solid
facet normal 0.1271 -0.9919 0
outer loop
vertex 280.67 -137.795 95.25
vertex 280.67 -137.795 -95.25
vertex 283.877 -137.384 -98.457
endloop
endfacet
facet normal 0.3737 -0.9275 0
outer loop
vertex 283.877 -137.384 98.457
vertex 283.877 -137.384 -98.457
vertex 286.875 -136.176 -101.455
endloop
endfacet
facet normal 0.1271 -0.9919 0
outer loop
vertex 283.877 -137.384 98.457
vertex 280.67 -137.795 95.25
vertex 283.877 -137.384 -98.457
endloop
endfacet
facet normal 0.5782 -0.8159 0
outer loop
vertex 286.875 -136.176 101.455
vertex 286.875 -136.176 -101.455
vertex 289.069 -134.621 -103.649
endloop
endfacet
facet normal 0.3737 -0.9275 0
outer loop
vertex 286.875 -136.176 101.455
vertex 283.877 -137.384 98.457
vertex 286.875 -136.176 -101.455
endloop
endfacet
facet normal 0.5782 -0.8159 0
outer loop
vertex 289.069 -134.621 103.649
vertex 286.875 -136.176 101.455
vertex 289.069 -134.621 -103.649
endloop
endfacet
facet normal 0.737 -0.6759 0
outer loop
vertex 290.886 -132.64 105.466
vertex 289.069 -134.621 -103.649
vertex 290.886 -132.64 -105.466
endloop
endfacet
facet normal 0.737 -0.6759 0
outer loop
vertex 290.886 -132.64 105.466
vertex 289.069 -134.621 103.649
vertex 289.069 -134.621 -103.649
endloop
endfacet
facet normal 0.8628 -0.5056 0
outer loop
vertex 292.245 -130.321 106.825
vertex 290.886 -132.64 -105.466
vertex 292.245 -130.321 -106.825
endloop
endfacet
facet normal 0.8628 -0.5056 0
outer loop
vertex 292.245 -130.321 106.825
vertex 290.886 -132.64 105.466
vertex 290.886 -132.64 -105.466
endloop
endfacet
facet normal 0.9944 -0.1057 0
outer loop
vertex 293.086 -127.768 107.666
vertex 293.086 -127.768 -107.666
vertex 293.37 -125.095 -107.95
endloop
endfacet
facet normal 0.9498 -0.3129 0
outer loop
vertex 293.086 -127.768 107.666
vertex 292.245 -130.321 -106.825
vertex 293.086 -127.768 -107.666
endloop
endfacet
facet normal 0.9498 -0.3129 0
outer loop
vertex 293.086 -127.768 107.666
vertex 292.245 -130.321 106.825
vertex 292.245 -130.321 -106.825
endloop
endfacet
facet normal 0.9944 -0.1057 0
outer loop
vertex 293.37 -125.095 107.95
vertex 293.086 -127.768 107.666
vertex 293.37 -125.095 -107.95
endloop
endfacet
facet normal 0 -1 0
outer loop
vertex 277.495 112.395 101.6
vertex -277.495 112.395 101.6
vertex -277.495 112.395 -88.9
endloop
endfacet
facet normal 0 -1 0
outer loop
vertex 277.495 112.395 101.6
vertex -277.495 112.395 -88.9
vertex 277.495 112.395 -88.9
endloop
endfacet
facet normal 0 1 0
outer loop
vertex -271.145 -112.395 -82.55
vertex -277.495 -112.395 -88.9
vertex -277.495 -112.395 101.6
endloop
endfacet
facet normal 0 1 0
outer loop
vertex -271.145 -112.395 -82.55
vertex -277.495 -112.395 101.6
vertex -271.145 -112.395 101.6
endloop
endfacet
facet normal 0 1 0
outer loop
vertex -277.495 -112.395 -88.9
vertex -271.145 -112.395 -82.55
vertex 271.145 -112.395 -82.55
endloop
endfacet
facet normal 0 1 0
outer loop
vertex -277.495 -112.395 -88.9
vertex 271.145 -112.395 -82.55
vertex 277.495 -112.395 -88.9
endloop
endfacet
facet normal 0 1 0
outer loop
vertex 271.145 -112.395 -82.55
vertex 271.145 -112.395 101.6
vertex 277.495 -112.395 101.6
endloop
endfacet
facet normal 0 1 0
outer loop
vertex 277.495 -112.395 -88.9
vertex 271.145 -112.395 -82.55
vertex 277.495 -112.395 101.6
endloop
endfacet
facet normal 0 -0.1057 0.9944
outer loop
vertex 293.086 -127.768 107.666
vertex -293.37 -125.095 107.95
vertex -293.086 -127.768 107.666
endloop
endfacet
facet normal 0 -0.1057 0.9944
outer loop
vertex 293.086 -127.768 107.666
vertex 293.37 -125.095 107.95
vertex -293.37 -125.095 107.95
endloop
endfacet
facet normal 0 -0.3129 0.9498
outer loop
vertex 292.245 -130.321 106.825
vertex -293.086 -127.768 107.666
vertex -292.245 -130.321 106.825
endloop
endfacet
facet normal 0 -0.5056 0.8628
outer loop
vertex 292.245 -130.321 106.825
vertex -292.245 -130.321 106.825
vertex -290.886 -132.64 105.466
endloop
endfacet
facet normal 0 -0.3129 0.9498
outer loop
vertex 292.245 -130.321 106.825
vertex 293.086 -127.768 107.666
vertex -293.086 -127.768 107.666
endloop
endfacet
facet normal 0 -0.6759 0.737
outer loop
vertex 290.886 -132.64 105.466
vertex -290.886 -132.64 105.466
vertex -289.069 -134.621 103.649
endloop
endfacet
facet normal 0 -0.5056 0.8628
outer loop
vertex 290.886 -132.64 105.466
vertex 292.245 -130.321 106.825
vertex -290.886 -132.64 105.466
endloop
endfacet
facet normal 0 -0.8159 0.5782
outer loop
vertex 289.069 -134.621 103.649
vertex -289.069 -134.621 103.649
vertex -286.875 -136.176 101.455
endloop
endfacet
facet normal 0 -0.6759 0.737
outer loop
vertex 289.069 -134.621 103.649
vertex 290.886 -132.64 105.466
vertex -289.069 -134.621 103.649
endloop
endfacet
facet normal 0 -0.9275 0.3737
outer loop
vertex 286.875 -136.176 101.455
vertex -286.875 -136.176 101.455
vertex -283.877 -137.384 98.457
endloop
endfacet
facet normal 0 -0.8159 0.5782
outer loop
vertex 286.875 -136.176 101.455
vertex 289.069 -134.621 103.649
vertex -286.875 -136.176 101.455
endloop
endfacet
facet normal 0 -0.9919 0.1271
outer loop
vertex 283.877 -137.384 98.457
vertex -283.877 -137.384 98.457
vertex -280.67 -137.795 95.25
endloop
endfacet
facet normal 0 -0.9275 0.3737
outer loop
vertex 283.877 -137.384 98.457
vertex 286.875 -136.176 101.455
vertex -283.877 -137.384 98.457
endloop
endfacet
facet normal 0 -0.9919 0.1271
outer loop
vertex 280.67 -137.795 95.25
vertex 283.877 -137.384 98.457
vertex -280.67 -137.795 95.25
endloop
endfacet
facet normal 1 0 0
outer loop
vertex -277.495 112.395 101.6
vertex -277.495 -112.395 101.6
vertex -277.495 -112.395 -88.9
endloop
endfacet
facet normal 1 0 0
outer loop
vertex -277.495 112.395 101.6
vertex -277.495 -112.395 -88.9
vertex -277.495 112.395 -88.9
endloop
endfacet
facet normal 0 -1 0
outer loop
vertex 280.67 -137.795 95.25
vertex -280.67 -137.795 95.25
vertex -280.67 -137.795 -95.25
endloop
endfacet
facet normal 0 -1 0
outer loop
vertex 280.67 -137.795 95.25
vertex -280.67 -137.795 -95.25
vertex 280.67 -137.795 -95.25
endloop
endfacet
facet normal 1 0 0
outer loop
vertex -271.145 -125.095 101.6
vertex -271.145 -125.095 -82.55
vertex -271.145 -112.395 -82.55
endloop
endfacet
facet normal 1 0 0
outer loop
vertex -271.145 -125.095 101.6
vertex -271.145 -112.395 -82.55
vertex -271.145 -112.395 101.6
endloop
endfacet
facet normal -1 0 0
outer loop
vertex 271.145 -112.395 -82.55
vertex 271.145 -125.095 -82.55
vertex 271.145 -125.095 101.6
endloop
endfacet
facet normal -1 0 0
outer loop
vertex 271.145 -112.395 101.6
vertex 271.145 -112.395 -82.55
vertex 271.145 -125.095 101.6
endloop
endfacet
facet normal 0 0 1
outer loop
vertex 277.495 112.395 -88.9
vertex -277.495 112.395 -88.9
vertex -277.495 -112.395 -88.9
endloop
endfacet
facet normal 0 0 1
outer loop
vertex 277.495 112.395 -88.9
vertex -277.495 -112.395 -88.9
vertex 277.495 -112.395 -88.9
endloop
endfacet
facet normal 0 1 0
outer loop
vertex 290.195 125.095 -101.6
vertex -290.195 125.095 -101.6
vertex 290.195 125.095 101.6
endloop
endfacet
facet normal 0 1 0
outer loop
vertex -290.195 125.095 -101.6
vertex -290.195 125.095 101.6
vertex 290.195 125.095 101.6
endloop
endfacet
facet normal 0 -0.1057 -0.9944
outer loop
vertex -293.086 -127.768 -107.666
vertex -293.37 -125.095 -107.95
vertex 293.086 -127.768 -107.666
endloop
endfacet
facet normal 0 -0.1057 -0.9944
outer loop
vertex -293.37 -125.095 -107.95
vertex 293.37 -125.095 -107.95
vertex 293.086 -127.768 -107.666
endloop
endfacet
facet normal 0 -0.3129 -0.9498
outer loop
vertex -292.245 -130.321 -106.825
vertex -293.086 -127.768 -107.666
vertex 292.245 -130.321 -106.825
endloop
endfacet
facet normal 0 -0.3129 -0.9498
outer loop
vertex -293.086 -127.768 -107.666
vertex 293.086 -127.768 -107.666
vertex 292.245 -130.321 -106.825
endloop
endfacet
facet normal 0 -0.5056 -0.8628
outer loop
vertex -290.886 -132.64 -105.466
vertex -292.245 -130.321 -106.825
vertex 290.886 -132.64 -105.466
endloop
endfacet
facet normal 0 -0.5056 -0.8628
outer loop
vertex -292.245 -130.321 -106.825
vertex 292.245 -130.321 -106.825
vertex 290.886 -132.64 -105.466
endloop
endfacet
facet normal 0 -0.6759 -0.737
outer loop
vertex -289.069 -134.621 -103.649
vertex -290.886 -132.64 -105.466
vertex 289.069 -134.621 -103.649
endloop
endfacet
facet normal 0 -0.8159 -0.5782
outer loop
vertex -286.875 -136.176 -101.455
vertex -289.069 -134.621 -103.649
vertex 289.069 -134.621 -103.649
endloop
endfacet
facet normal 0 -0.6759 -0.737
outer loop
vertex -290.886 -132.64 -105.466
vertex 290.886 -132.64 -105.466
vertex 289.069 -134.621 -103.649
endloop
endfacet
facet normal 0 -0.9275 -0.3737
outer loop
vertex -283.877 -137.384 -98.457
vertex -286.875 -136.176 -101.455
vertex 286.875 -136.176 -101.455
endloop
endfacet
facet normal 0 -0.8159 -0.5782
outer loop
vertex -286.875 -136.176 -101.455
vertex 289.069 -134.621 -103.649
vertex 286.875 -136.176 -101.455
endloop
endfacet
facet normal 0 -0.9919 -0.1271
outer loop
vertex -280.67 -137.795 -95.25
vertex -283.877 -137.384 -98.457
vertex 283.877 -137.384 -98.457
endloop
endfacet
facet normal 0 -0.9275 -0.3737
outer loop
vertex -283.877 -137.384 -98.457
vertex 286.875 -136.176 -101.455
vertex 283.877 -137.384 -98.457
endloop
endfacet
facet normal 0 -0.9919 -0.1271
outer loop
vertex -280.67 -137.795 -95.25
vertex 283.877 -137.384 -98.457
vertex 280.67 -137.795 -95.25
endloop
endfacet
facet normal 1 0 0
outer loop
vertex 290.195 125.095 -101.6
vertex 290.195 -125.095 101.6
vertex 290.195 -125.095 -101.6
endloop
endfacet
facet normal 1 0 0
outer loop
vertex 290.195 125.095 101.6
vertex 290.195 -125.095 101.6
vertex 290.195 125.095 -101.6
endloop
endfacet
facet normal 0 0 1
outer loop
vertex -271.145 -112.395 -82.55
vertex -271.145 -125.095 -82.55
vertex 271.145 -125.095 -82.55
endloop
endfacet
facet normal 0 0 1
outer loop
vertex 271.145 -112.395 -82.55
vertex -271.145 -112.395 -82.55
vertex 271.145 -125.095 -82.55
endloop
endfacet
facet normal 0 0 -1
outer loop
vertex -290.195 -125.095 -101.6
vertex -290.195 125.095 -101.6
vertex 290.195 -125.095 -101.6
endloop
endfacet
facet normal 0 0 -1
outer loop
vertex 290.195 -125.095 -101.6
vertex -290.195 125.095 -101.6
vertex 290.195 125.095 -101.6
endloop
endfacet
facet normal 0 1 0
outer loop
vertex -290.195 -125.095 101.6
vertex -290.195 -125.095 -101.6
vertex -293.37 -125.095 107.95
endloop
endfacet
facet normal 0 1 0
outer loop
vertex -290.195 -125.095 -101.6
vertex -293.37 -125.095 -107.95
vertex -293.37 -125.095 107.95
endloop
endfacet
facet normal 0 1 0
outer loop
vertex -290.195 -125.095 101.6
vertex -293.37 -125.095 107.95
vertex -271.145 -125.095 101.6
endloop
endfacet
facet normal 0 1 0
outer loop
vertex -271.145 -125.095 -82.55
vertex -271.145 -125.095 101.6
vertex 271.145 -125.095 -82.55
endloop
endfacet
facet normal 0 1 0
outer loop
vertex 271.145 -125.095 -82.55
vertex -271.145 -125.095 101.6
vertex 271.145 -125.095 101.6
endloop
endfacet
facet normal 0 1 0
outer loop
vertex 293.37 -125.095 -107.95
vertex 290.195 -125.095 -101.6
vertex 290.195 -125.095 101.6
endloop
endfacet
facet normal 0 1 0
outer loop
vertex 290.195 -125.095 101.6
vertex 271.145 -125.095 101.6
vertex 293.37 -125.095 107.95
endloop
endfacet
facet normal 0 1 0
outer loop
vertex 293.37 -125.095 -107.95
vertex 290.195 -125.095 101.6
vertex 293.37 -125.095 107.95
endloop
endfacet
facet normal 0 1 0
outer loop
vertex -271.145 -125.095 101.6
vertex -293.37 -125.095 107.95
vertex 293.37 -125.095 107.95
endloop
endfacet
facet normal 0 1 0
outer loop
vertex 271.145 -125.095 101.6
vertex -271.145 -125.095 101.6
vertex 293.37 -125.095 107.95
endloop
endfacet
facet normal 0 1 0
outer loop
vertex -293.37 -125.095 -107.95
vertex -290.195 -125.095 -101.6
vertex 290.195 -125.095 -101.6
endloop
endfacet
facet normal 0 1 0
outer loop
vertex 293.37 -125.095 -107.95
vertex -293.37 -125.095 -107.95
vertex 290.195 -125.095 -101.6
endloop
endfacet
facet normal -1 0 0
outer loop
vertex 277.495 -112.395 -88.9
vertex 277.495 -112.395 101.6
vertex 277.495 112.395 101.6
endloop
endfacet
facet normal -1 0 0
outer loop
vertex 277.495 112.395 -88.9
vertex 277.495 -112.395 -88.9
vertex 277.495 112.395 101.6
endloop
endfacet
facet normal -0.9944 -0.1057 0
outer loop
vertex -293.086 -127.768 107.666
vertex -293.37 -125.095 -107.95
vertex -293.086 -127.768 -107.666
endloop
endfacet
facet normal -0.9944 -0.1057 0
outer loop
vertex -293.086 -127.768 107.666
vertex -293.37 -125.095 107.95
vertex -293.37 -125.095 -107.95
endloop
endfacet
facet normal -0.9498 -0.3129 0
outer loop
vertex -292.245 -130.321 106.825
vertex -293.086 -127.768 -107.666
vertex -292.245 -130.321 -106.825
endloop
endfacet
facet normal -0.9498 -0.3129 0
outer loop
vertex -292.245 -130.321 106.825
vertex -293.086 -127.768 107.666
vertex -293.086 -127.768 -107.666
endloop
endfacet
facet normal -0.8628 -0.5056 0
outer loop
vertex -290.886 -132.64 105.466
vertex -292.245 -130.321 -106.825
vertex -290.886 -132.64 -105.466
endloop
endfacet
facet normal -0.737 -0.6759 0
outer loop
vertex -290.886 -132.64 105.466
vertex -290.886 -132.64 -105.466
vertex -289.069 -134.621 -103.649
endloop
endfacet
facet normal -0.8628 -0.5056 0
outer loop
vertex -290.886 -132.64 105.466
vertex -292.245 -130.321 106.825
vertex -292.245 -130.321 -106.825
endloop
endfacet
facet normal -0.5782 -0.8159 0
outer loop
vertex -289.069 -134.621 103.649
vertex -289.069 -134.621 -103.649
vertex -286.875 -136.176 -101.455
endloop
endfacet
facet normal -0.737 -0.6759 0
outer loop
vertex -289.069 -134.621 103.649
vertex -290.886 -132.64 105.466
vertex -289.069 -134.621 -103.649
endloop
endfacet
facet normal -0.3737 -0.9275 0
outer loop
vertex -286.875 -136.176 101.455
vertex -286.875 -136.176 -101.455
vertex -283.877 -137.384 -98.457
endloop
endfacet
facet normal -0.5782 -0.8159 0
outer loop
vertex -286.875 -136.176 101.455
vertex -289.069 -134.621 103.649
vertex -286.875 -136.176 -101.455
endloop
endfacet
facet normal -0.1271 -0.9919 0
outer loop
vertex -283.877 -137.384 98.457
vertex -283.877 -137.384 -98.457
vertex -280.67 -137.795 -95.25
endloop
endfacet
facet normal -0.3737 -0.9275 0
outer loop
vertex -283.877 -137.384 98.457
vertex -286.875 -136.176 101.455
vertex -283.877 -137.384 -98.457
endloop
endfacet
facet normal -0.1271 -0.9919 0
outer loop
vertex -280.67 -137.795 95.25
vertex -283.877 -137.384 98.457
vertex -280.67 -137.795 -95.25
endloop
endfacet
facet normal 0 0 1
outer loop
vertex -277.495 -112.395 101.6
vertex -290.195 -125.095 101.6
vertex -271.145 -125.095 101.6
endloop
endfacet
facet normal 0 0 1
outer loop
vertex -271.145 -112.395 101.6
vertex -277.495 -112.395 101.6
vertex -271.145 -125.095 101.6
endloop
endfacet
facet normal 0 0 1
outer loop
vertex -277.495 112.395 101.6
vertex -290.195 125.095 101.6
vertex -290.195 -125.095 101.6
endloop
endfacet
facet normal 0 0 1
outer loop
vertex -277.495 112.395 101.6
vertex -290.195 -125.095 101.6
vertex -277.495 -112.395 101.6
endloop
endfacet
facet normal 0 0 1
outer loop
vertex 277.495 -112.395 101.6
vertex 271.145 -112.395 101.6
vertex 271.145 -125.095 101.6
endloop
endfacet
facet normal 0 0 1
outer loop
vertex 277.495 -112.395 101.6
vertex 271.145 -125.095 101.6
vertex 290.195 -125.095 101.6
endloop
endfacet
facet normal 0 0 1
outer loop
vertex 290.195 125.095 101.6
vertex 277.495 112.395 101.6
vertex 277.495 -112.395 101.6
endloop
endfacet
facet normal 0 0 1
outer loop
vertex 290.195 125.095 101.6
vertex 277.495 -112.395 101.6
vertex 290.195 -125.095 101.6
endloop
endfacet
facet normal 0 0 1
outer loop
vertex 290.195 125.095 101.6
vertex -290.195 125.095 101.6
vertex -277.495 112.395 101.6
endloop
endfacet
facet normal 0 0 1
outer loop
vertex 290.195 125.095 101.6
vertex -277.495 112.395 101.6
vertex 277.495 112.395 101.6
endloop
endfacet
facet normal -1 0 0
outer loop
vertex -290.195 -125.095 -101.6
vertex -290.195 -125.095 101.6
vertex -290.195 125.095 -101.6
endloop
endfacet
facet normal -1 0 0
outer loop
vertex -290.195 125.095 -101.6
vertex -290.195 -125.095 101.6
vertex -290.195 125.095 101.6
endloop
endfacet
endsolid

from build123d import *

# Parameters (mm, degrees)
F0_W     = 580.39
F0_H     = 250.19
F1_DEPTH = 101.6
F2_T     = -12.7
F3_W     = 542.29
F3_H     = 184.15
F4_DEPTH = 25.4
F5_W     = 586.74
F5_H     = 215.9
F6_DEPTH = 12.7
F7_R     = 12.69999


# Not quite as in the source:
# - a fillet or chamfer is up to 0.001 mm smaller than in the source, because OpenCascade refuses the exact size


with BuildPart() as f1:
    # F0 (on Top) → F1 (new body, symmetric)
    with BuildSketch(Plane.XY):
        Rectangle(F0_W, F0_H)
    extrude(amount=F1_DEPTH, both=True)

    # F2
    f2_openings = [f1.faces().sort_by_distance(p)[0] for p in [
        (0, 0, 101.6),
    ]]
    offset(amount=F2_T, openings=f2_openings)

    # F3 (on face) → F4 (cut)
    with BuildSketch(Plane.XZ.offset(125.095)):
        with Locations((0, 9.525)):
            Rectangle(F3_W, F3_H)
    extrude(amount=-F4_DEPTH, mode=Mode.SUBTRACT)

    # F5 (on face) → F6 (join)
    with BuildSketch(Plane.XZ.offset(125.095)):
        Rectangle(F5_W, F5_H)
        Polygon((-290.195, -101.6), (-290.195, 101.6), (-271.145, 101.6), (-271.145, -82.55), (271.145, -82.55), (271.145, 101.6), (290.195, 101.6), (290.195, -101.6), align=None, mode=Mode.SUBTRACT)
        Polygon((-271.145, 101.6), (-290.195, 101.6), (-290.195, -101.6), (290.195, -101.6), (290.195, 101.6), (271.145, 101.6), (271.145, -82.55), (-271.145, -82.55), align=None)
    extrude(amount=F6_DEPTH)

    # F7 (radius 12.7 in the source; OpenCascade refuses exactly that, so slightly less here)
    f7_edges = [f1.edges().sort_by_distance(p)[0] for p in [
        (0, -137.795, 107.95),
        (-293.37, -137.795, 0),
        (0, -137.795, -107.95),
        (293.37, -137.795, 0),
    ]]
    fillet(f7_edges, radius=F7_R)


solid = f1.part
